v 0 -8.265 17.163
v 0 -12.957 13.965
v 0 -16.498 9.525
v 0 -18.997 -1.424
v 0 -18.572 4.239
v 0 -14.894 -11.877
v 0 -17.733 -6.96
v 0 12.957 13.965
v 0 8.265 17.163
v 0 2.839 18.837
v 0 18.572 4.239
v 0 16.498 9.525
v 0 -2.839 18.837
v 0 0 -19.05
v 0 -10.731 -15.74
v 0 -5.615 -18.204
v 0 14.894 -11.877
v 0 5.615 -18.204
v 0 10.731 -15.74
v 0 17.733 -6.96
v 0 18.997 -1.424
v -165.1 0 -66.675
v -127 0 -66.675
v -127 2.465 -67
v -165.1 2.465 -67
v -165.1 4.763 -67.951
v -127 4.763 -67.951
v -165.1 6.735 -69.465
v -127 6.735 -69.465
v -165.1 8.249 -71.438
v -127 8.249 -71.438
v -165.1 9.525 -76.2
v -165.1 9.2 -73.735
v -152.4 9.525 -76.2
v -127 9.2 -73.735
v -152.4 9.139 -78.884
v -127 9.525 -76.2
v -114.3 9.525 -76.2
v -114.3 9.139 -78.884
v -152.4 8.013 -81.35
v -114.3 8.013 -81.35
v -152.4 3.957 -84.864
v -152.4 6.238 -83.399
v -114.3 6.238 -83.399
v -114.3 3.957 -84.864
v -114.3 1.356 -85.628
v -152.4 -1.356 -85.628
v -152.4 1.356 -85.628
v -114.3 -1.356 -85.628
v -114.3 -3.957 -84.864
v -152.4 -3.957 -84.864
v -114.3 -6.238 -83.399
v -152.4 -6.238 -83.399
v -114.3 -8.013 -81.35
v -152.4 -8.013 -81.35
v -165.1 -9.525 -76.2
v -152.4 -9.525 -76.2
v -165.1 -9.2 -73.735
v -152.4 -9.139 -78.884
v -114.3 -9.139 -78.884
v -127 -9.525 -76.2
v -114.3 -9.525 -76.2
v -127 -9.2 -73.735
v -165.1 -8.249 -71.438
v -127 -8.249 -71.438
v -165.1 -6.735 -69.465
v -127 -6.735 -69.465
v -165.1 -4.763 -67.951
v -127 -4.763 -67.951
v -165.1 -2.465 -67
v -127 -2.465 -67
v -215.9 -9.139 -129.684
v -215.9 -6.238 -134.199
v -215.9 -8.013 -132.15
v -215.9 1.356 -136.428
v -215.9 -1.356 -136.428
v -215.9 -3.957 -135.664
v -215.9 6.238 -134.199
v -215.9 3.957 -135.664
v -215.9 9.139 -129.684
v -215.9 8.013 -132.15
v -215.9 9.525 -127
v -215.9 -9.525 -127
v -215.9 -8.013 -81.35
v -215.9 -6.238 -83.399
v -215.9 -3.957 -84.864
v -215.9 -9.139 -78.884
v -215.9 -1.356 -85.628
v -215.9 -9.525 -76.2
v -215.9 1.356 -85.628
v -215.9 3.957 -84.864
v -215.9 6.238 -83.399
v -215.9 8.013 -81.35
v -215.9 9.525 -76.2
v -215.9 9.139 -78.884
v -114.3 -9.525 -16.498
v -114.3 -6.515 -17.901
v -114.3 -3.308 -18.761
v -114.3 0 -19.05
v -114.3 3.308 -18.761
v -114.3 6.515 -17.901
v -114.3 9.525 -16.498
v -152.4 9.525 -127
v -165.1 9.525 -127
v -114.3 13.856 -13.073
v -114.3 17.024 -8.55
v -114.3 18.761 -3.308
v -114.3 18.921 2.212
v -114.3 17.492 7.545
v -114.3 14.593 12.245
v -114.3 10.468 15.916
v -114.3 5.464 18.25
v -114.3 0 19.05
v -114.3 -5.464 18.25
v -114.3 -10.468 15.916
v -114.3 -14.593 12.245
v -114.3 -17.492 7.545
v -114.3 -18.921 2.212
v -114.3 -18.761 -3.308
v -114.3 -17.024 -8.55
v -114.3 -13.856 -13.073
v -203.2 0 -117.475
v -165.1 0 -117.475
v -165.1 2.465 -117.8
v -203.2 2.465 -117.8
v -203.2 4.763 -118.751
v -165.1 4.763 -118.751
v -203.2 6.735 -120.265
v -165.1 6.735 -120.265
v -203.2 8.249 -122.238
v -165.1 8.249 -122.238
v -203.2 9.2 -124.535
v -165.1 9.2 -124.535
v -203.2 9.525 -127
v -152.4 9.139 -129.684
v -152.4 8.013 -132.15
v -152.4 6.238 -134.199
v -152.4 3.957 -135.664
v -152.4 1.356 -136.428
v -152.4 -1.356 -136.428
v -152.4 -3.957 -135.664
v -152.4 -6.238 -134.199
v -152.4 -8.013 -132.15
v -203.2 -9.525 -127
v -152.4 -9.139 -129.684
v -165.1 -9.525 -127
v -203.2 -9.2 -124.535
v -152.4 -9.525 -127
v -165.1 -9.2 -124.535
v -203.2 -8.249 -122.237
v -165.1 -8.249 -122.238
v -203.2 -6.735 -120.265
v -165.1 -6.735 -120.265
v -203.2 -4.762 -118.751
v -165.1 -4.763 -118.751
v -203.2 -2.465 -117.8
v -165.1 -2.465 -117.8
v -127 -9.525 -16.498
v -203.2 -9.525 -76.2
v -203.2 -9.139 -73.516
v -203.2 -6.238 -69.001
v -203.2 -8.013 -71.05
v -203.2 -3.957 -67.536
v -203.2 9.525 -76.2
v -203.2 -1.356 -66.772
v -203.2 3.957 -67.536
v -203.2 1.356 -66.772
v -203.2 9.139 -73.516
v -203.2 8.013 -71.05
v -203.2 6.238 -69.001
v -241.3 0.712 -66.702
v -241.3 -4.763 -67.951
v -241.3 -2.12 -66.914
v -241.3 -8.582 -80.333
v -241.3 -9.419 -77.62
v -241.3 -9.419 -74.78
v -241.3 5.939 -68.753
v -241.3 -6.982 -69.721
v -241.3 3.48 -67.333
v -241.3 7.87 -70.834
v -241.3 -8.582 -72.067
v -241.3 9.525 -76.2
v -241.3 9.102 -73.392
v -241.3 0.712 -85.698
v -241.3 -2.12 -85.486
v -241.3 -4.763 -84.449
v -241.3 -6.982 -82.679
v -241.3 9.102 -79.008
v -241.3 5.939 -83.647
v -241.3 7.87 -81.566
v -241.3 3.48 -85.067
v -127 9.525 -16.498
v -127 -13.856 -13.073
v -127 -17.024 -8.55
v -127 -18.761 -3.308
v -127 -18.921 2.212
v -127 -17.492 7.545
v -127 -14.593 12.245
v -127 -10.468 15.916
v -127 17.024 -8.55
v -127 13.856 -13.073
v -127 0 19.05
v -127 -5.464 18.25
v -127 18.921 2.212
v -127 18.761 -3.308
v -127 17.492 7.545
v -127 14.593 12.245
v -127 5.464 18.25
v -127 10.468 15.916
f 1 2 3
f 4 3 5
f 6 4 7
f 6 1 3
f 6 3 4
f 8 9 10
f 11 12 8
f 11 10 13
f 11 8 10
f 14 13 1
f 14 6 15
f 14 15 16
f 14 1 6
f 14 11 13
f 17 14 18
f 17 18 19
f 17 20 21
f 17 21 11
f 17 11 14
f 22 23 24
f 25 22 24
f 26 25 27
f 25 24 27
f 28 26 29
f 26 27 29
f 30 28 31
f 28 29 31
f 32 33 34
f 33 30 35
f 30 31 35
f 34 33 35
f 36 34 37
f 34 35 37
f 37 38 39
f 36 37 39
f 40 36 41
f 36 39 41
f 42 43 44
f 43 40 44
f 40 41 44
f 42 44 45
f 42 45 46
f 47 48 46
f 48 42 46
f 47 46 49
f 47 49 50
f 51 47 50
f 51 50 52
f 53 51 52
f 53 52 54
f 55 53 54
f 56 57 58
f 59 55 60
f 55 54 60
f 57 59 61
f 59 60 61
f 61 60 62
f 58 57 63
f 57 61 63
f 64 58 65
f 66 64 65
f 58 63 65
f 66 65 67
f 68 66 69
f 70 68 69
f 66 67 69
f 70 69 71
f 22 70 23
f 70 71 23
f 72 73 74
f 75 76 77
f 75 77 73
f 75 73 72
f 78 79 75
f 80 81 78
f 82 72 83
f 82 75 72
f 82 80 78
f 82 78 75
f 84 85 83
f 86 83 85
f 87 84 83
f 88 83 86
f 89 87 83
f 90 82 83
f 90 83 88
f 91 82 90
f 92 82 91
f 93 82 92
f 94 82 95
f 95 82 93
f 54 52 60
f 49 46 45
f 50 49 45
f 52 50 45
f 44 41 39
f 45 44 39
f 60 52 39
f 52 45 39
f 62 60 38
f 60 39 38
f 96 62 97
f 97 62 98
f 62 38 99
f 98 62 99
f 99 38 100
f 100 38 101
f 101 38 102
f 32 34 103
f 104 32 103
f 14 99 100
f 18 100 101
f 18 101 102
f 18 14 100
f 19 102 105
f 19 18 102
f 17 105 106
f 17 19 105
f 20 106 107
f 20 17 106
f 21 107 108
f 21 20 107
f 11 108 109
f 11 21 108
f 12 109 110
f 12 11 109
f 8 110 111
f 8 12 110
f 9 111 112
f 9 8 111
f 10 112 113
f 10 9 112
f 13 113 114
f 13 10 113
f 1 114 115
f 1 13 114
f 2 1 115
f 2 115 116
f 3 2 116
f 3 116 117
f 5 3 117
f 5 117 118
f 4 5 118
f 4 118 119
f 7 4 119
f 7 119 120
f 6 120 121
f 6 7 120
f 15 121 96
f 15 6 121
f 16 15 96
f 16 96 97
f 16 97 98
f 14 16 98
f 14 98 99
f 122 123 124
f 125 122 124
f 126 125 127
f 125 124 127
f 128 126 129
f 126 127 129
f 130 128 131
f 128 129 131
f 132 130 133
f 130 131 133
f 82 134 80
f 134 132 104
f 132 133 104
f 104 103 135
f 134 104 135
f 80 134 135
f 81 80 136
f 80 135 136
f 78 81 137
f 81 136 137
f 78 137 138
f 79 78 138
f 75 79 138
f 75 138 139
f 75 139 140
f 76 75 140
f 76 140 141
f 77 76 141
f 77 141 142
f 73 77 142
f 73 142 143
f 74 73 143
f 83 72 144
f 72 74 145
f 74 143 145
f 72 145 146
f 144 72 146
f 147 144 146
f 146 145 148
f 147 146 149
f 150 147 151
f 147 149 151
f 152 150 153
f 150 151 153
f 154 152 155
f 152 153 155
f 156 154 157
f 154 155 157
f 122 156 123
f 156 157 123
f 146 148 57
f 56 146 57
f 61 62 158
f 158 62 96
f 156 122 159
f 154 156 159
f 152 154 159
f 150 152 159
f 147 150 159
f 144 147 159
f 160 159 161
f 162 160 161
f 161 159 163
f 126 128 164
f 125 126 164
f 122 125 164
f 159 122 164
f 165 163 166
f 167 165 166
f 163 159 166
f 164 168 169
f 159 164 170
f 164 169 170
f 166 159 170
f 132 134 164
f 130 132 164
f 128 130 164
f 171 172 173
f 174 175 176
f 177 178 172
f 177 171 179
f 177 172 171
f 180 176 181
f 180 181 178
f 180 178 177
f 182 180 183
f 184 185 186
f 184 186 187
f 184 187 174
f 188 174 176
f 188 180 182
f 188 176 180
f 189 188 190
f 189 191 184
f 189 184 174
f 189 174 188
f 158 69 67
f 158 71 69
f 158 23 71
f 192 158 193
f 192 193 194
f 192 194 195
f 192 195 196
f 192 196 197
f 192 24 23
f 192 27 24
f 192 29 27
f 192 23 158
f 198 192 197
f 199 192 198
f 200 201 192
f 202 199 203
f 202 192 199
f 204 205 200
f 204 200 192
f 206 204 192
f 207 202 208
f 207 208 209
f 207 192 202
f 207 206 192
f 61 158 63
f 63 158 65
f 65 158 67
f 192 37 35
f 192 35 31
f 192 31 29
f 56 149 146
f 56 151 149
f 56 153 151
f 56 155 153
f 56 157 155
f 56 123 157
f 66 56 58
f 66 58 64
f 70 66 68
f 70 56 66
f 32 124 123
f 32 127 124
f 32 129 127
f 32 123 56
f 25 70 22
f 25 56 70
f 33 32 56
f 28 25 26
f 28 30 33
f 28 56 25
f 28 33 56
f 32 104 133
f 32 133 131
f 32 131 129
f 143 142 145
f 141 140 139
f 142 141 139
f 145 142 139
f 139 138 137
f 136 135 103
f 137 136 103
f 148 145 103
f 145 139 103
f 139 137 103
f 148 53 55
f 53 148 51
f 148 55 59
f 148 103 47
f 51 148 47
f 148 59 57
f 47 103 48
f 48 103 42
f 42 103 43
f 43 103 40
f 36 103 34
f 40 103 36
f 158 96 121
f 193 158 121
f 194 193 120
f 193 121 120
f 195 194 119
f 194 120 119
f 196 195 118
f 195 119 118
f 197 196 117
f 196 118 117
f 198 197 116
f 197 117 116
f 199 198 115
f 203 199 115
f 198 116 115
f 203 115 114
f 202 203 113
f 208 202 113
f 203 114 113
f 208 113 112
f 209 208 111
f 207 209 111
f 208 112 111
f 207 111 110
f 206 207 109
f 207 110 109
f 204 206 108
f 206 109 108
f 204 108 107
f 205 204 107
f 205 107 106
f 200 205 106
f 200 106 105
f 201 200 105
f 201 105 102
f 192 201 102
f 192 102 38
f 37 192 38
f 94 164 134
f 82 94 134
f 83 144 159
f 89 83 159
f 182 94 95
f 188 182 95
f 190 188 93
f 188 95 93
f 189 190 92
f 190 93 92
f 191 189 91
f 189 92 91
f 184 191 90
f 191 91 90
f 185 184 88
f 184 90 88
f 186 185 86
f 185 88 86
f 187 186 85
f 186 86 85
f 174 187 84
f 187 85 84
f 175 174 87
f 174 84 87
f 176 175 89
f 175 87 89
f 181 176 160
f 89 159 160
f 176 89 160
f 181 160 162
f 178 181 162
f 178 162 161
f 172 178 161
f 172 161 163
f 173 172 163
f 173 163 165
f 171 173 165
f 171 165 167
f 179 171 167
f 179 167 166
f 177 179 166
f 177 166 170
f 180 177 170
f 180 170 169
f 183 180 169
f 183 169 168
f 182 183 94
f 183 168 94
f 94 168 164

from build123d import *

# Parameters (mm, degrees)
SKETCH1_R           = 19.05
BOSS_EXTRUDE1_DEPTH = 127
BOSS_EXTRUDE2_START = -12.7
SKETCH2_R           = 9.525000000000007
BOSS_EXTRUDE2_DEPTH = 12.7
SKETCH2_3_R         = 9.525000000000007
BOSS_EXTRUDE3_DEPTH = 38.1
BOSS_EXTRUDE4_START = -12.7
SKETCH3_R           = 9.525000000000007
BOSS_EXTRUDE4_DEPTH = 12.7
SKETCH3_3_R         = 9.525000000000007
BOSS_EXTRUDE5_DEPTH = 50.8
BOSS_EXTRUDE6_START = 38.099999999999994
SKETCH3_4_R         = 9.525000000000007
BOSS_EXTRUDE6_DEPTH = 12.7
BOSS_EXTRUDE7_START = 88.9
SKETCH2_4_R         = 9.525000000000007
BOSS_EXTRUDE7_DEPTH = 25.4


with BuildPart() as part:
    # Sketch1 → Boss-Extrude1 (new body)
    with BuildSketch(Plane(origin=(0, 0, 0), x_dir=(0, 0, -1), z_dir=(1, 0, 0))):
        Circle(SKETCH1_R)
    extrude(amount=-BOSS_EXTRUDE1_DEPTH)

    # Sketch2 → Boss-Extrude2 (add)
    with BuildSketch(Plane.ZY.offset(127).offset(BOSS_EXTRUDE2_START)):
        with BuildLine():
            Line((-16.497783942092994, 9.525000000000002), (-76.2, 9.525000000000007))
            ThreePointArc((-76.2, 9.525000000000007), (-69.46480790919813, 6.73519209080187), (-66.675, 0))
            ThreePointArc((-66.675, -2.33e-15), (-69.46480790919813, -6.735192090801872), (-76.2, -9.525000000000007))
            Line((-76.2, -9.525000000000007), (-16.497783942092994, -9.525000000000002))
            ThreePointArc((-16.49778394209321, -9.525000000000603), (-19.05, 2.33e-15), (-16.497783942093204, 9.525000000000615))
        make_face()
        with BuildLine():
            ThreePointArc((19.05, 0), (4.930502809203364, 18.400886990806658), (-16.497783942093204, 9.525000000000615))
            Line((-16.497783942092994, 9.525000000000002), (0, 9.525))
            Line((0, 9.525), (0, -9.525))
            Line((0, -9.525), (-16.497783942092994, -9.525000000000002))
            ThreePointArc((-16.49778394209321, -9.525000000000603), (4.930502809203355, -18.40088699080666), (19.05, -4.67e-15))
        make_face()
        with BuildLine():
            Line((0, 9.525), (-16.497783942092994, 9.525000000000002))
            ThreePointArc((-16.497783942093204, 9.525000000000615), (-19.05, 2.33e-15), (-16.49778394209321, -9.525000000000603))
            Line((-16.497783942092994, -9.525000000000002), (0, -9.525))
            Line((0, -9.525), (0, 9.525))
        make_face()
        with Locations((-76.2, 0)):
            Circle(SKETCH2_R)
    extrude(amount=BOSS_EXTRUDE2_DEPTH)

    # Sketch2<3> → Boss-Extrude3 (add)
    with BuildSketch(Plane.ZY.offset(127)):
        with Locations((-76.2, 0)):
            Circle(SKETCH2_3_R)
    extrude(amount=BOSS_EXTRUDE3_DEPTH)

    # Sketch3 → Boss-Extrude4 (add)
    with BuildSketch(Plane.ZY.offset(165.1).offset(BOSS_EXTRUDE4_START)):
        with BuildLine():
            Line((-76.2, 9.525000000000007), (-127, 9.525000000000007))
            ThreePointArc((-127, 9.525000000000007), (-120.26480790919813, 6.73519209080187), (-117.475, 0))
            ThreePointArc((-117.475, -2.33e-15), (-120.26480790919813, -6.735192090801872), (-127, -9.525000000000007))
            Line((-127, -9.525000000000007), (-76.2, -9.525000000000007))
            ThreePointArc((-76.2, -9.525000000000006), (-85.72500000000001, 1.17e-15), (-76.2, 9.525000000000006))
        make_face()
        with Locations((-127, 0)):
            Circle(SKETCH3_R)
    extrude(amount=BOSS_EXTRUDE4_DEPTH)

    # Sketch3<3> → Boss-Extrude5 (add)
    with BuildSketch(Plane.ZY.offset(165.1)):
        with Locations((-127, 0)):
            Circle(SKETCH3_3_R)
    extrude(amount=BOSS_EXTRUDE5_DEPTH)

    # Sketch3<4> → Boss-Extrude6 (add)
    with BuildSketch(Plane.ZY.offset(165.1).offset(BOSS_EXTRUDE6_START)):
        with BuildLine():
            Line((-76.2, 9.525000000000007), (-127, 9.525000000000007))
            ThreePointArc((-127, 9.525000000000007), (-120.26480790919813, 6.73519209080187), (-117.475, 0))
            ThreePointArc((-117.475, -2.33e-15), (-120.26480790919813, -6.735192090801872), (-127, -9.525000000000007))
            Line((-127, -9.525000000000007), (-76.2, -9.525000000000007))
            ThreePointArc((-76.2, -9.525000000000006), (-85.72500000000001, 1.17e-15), (-76.2, 9.525000000000006))
        make_face()
        with Locations(Location((-76.2, 0, 0), (0, 0, 90))):
            Circle(SKETCH3_4_R)
    extrude(amount=BOSS_EXTRUDE6_DEPTH)

    # Sketch2<4> → Boss-Extrude7 (add)
    with BuildSketch(Plane.ZY.offset(127).offset(BOSS_EXTRUDE7_START)):
        with Locations(Location((-76.2, 0, 0), (0, 0, 90))):
            Circle(SKETCH2_4_R)
    extrude(amount=BOSS_EXTRUDE7_DEPTH)


solid = part.part
